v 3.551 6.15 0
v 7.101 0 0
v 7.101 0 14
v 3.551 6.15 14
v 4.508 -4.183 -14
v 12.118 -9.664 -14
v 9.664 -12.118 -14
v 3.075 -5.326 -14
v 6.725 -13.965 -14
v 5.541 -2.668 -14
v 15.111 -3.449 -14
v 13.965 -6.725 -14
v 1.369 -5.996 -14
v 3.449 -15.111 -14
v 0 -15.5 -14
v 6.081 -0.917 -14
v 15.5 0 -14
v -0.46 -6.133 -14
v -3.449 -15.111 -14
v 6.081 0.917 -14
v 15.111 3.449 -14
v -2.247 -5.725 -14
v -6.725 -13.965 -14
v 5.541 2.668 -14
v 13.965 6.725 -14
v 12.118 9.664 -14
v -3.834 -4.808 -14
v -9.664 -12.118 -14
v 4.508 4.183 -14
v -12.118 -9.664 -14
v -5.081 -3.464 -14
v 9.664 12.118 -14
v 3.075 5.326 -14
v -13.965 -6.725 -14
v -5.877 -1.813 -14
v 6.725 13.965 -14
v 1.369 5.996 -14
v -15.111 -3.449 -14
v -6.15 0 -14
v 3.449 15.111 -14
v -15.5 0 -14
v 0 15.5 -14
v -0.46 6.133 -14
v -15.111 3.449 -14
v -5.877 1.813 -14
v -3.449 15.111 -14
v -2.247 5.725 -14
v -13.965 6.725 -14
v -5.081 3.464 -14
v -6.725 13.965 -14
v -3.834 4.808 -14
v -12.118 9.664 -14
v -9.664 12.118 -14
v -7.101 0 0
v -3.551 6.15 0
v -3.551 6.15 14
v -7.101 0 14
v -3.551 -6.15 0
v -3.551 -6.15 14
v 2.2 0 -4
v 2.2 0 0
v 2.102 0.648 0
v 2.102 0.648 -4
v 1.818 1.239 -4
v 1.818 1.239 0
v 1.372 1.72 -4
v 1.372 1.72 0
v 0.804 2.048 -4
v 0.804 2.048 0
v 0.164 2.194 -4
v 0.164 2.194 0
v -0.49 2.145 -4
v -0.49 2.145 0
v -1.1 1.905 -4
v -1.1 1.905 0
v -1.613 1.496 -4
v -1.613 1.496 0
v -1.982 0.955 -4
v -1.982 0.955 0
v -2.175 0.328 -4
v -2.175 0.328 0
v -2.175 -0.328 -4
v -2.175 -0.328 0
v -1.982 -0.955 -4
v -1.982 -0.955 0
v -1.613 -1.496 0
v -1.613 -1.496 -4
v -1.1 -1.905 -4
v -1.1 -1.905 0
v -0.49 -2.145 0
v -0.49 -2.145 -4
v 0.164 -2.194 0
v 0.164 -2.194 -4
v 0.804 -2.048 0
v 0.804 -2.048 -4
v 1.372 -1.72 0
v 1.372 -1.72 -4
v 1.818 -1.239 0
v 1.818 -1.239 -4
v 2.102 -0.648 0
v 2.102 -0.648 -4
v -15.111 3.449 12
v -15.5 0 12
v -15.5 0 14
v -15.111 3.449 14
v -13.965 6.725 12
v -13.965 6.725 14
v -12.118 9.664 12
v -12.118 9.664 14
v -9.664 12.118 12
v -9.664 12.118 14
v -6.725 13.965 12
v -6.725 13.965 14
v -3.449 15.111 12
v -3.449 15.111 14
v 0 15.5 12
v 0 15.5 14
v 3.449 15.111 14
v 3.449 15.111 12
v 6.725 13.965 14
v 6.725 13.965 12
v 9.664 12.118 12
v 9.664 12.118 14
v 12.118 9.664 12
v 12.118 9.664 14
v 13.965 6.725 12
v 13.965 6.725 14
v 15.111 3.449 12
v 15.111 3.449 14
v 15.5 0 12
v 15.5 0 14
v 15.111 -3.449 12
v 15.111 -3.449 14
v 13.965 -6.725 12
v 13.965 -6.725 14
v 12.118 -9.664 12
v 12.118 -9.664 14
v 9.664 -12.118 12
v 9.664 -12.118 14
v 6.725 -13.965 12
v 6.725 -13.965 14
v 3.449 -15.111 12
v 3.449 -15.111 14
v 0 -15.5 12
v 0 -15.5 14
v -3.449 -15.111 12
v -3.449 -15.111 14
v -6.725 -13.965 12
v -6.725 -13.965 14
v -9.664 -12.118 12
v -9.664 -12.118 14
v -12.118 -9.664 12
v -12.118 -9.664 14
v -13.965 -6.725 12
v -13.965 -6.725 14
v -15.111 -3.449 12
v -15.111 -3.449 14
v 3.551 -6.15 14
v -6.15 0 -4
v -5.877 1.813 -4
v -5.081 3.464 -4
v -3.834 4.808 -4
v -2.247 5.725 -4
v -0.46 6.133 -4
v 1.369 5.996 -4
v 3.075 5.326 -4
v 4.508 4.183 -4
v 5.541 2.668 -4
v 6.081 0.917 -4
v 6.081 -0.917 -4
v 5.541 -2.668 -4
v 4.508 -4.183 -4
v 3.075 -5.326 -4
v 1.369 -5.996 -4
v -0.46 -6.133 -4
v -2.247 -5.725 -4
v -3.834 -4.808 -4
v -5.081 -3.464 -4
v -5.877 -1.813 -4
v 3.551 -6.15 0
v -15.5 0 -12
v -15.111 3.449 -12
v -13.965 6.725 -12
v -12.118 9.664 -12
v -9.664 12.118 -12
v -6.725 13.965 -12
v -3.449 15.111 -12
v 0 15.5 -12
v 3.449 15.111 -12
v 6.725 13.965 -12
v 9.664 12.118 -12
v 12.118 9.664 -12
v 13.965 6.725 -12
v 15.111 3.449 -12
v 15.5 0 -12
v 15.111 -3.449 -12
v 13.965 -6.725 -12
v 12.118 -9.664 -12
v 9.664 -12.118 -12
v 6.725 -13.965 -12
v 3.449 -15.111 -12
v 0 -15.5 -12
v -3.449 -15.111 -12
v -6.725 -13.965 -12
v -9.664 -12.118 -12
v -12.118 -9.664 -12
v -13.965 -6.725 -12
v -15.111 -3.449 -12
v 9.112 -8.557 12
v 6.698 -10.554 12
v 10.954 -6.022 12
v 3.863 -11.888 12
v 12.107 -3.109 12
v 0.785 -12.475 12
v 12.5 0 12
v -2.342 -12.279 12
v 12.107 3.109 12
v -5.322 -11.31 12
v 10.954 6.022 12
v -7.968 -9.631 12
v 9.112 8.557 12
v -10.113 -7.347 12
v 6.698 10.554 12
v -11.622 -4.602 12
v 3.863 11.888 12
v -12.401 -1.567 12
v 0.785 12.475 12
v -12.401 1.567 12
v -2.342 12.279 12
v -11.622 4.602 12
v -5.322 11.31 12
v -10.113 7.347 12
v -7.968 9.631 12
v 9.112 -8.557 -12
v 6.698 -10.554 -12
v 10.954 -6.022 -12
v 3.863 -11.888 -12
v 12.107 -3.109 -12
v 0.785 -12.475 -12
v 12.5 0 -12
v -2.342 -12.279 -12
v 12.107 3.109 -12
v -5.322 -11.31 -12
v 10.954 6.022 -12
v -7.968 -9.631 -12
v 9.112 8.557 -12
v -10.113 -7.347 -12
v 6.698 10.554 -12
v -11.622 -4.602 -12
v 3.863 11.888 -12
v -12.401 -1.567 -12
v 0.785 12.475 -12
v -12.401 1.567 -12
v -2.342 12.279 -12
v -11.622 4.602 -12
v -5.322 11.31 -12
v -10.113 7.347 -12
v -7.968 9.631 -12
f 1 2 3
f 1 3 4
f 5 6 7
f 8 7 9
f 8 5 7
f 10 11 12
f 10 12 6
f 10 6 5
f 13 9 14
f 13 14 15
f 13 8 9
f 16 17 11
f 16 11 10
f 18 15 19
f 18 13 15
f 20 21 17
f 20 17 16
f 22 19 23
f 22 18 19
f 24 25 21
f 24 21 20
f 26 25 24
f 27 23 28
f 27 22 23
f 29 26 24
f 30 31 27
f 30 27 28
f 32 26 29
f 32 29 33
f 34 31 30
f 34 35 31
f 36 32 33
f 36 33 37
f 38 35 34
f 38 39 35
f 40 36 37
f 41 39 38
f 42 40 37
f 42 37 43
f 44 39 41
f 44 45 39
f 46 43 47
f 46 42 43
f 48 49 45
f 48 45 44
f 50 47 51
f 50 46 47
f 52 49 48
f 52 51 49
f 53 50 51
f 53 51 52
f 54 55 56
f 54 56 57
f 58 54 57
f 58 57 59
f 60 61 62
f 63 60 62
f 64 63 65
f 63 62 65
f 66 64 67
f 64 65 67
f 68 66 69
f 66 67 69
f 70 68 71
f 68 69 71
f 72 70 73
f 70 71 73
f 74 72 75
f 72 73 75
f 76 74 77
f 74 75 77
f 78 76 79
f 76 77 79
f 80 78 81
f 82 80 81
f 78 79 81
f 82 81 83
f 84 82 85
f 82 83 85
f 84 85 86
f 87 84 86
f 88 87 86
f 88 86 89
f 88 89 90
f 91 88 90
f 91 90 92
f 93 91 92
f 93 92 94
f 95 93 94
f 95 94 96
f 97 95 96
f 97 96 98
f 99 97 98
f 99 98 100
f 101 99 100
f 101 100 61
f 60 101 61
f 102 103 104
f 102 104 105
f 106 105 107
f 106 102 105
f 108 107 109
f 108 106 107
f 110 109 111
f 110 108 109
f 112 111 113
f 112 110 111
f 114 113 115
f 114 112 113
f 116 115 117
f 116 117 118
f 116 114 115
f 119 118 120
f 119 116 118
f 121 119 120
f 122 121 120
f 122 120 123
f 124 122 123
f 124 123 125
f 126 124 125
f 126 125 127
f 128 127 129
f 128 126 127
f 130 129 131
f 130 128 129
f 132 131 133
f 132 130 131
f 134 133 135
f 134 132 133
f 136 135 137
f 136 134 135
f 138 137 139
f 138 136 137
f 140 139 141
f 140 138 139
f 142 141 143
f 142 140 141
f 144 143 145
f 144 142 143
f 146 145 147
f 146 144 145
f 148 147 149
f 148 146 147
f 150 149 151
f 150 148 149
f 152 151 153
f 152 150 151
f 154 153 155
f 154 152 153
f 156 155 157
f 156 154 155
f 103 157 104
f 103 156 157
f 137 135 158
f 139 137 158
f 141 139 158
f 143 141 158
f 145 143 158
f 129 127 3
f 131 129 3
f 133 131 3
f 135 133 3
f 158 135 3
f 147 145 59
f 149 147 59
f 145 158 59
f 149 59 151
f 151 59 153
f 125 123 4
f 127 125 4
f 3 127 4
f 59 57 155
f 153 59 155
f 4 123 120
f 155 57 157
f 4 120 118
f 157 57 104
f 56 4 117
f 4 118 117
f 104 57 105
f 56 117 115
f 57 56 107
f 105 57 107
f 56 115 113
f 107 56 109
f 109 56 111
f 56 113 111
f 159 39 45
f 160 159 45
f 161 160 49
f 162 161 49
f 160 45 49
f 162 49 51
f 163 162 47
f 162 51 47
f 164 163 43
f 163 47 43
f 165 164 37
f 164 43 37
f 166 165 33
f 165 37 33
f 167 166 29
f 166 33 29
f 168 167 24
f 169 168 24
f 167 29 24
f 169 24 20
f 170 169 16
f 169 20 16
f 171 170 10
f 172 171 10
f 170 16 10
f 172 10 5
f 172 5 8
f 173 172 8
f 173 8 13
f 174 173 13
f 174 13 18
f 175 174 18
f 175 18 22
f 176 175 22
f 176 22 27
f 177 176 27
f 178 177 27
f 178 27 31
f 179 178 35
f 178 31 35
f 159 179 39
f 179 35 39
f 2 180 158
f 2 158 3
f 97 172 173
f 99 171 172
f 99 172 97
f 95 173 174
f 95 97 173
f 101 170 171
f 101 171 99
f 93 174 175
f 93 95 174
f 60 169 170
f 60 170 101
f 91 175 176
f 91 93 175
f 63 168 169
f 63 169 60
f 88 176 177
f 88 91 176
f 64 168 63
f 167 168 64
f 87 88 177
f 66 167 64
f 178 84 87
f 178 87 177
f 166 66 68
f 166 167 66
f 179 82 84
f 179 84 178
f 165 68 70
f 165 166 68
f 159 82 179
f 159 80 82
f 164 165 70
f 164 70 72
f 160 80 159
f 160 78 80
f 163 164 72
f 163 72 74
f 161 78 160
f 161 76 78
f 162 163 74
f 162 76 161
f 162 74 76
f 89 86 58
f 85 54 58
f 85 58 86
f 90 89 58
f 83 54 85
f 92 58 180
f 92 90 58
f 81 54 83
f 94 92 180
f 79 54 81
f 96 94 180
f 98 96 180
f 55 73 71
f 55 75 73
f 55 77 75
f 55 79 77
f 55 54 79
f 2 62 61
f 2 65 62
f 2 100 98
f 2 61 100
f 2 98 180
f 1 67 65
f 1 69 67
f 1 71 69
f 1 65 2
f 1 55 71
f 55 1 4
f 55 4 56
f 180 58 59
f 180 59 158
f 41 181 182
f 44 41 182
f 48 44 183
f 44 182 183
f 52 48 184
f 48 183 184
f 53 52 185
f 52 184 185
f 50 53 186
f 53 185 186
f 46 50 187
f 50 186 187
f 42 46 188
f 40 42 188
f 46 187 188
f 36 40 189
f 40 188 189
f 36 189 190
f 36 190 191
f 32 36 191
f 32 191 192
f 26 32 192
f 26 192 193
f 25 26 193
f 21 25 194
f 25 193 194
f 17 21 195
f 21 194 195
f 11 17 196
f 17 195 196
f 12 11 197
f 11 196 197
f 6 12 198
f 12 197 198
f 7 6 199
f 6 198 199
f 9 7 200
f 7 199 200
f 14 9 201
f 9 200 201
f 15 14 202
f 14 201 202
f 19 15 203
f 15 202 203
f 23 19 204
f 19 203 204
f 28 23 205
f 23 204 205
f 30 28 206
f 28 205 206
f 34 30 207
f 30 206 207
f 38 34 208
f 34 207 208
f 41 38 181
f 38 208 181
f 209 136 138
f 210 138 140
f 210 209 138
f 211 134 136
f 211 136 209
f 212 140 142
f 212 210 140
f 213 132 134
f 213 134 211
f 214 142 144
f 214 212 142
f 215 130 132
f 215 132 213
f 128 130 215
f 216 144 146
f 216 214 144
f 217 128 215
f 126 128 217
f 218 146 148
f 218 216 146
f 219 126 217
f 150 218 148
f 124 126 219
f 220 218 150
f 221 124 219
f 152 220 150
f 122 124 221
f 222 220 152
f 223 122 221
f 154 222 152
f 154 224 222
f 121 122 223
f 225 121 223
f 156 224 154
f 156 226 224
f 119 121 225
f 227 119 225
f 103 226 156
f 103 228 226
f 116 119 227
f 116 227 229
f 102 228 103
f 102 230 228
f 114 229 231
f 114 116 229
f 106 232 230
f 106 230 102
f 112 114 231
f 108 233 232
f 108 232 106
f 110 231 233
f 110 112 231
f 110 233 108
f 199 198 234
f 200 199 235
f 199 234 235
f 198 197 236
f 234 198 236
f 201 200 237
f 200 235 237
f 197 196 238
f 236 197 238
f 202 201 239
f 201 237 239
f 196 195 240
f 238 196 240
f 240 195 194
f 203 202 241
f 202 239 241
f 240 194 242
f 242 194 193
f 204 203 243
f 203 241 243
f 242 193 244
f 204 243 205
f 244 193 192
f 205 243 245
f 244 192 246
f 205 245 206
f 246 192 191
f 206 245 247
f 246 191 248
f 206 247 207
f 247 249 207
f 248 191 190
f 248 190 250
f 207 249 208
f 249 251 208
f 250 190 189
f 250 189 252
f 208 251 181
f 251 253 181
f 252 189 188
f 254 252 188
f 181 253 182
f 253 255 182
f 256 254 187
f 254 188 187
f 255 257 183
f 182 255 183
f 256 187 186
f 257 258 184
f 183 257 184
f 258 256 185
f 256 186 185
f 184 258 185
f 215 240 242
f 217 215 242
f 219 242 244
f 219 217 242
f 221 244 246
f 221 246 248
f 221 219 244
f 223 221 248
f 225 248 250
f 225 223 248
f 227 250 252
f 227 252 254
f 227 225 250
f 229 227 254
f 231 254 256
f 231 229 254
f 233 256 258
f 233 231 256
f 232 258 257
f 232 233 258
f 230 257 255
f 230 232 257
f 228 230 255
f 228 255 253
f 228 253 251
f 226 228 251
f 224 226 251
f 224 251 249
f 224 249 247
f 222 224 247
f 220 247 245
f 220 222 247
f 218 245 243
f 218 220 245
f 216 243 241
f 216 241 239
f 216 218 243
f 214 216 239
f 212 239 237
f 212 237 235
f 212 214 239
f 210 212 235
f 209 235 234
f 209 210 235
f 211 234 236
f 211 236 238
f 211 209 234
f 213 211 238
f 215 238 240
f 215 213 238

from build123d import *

# Parameters (mm, degrees)
SKETCH1_R           = 12.5
BOSS_EXTRUDE1_DEPTH = 12
SKETCH2_R           = 15.5
BOSS_EXTRUDE2_DEPTH = 2
CUT_EXTRUDE1_DEPTH  = 14
SKETCH5_R           = 2.2
CUT_EXTRUDE2_DEPTH  = 14
SKETCH6_R           = 6.15
CUT_EXTRUDE3_DEPTH  = 10


with BuildPart() as part:
    # Sketch1 → Boss-Extrude1 (new body)
    with BuildSketch(Plane.XY):
        Circle(SKETCH1_R)
    boss_extrude1 = extrude(amount=BOSS_EXTRUDE1_DEPTH)

    # Sketch2 → Boss-Extrude2 (add)
    with BuildSketch(Plane(origin=(0, 0, 12), x_dir=(-1, 0, 0), z_dir=(0, 0, -1))):
        Circle(SKETCH2_R)
    boss_extrude2 = extrude(amount=-BOSS_EXTRUDE2_DEPTH)

    # Sketch3 → Cut-Extrude1 (cut)
    with BuildSketch(Plane.XY):
        Polygon((3.550704156, -6.15), (7.101408311, 0), (3.550704156, 6.15), (-3.550704156, 6.15), (-7.101408311, 0), (-3.550704156, -6.15), align=None)
    extrude(amount=CUT_EXTRUDE1_DEPTH, mode=Mode.SUBTRACT)

    # Mirror1: Boss-Extrude1, Boss-Extrude2 across plane
    add(boss_extrude1.mirror(Plane.XY))
    add(boss_extrude2.mirror(Plane.XY))

    # Sketch5 → Cut-Extrude2 (cut)
    with BuildSketch(Plane.XY):
        Circle(SKETCH5_R)
    extrude(amount=-CUT_EXTRUDE2_DEPTH, mode=Mode.SUBTRACT)

    # Sketch6 → Cut-Extrude3 (cut)
    with BuildSketch(Plane(origin=(0, 0, -14), x_dir=(-1, 0, 0), z_dir=(0, 0, -1))):
        Circle(SKETCH6_R)
    extrude(amount=-CUT_EXTRUDE3_DEPTH, mode=Mode.SUBTRACT)


solid = part.part
